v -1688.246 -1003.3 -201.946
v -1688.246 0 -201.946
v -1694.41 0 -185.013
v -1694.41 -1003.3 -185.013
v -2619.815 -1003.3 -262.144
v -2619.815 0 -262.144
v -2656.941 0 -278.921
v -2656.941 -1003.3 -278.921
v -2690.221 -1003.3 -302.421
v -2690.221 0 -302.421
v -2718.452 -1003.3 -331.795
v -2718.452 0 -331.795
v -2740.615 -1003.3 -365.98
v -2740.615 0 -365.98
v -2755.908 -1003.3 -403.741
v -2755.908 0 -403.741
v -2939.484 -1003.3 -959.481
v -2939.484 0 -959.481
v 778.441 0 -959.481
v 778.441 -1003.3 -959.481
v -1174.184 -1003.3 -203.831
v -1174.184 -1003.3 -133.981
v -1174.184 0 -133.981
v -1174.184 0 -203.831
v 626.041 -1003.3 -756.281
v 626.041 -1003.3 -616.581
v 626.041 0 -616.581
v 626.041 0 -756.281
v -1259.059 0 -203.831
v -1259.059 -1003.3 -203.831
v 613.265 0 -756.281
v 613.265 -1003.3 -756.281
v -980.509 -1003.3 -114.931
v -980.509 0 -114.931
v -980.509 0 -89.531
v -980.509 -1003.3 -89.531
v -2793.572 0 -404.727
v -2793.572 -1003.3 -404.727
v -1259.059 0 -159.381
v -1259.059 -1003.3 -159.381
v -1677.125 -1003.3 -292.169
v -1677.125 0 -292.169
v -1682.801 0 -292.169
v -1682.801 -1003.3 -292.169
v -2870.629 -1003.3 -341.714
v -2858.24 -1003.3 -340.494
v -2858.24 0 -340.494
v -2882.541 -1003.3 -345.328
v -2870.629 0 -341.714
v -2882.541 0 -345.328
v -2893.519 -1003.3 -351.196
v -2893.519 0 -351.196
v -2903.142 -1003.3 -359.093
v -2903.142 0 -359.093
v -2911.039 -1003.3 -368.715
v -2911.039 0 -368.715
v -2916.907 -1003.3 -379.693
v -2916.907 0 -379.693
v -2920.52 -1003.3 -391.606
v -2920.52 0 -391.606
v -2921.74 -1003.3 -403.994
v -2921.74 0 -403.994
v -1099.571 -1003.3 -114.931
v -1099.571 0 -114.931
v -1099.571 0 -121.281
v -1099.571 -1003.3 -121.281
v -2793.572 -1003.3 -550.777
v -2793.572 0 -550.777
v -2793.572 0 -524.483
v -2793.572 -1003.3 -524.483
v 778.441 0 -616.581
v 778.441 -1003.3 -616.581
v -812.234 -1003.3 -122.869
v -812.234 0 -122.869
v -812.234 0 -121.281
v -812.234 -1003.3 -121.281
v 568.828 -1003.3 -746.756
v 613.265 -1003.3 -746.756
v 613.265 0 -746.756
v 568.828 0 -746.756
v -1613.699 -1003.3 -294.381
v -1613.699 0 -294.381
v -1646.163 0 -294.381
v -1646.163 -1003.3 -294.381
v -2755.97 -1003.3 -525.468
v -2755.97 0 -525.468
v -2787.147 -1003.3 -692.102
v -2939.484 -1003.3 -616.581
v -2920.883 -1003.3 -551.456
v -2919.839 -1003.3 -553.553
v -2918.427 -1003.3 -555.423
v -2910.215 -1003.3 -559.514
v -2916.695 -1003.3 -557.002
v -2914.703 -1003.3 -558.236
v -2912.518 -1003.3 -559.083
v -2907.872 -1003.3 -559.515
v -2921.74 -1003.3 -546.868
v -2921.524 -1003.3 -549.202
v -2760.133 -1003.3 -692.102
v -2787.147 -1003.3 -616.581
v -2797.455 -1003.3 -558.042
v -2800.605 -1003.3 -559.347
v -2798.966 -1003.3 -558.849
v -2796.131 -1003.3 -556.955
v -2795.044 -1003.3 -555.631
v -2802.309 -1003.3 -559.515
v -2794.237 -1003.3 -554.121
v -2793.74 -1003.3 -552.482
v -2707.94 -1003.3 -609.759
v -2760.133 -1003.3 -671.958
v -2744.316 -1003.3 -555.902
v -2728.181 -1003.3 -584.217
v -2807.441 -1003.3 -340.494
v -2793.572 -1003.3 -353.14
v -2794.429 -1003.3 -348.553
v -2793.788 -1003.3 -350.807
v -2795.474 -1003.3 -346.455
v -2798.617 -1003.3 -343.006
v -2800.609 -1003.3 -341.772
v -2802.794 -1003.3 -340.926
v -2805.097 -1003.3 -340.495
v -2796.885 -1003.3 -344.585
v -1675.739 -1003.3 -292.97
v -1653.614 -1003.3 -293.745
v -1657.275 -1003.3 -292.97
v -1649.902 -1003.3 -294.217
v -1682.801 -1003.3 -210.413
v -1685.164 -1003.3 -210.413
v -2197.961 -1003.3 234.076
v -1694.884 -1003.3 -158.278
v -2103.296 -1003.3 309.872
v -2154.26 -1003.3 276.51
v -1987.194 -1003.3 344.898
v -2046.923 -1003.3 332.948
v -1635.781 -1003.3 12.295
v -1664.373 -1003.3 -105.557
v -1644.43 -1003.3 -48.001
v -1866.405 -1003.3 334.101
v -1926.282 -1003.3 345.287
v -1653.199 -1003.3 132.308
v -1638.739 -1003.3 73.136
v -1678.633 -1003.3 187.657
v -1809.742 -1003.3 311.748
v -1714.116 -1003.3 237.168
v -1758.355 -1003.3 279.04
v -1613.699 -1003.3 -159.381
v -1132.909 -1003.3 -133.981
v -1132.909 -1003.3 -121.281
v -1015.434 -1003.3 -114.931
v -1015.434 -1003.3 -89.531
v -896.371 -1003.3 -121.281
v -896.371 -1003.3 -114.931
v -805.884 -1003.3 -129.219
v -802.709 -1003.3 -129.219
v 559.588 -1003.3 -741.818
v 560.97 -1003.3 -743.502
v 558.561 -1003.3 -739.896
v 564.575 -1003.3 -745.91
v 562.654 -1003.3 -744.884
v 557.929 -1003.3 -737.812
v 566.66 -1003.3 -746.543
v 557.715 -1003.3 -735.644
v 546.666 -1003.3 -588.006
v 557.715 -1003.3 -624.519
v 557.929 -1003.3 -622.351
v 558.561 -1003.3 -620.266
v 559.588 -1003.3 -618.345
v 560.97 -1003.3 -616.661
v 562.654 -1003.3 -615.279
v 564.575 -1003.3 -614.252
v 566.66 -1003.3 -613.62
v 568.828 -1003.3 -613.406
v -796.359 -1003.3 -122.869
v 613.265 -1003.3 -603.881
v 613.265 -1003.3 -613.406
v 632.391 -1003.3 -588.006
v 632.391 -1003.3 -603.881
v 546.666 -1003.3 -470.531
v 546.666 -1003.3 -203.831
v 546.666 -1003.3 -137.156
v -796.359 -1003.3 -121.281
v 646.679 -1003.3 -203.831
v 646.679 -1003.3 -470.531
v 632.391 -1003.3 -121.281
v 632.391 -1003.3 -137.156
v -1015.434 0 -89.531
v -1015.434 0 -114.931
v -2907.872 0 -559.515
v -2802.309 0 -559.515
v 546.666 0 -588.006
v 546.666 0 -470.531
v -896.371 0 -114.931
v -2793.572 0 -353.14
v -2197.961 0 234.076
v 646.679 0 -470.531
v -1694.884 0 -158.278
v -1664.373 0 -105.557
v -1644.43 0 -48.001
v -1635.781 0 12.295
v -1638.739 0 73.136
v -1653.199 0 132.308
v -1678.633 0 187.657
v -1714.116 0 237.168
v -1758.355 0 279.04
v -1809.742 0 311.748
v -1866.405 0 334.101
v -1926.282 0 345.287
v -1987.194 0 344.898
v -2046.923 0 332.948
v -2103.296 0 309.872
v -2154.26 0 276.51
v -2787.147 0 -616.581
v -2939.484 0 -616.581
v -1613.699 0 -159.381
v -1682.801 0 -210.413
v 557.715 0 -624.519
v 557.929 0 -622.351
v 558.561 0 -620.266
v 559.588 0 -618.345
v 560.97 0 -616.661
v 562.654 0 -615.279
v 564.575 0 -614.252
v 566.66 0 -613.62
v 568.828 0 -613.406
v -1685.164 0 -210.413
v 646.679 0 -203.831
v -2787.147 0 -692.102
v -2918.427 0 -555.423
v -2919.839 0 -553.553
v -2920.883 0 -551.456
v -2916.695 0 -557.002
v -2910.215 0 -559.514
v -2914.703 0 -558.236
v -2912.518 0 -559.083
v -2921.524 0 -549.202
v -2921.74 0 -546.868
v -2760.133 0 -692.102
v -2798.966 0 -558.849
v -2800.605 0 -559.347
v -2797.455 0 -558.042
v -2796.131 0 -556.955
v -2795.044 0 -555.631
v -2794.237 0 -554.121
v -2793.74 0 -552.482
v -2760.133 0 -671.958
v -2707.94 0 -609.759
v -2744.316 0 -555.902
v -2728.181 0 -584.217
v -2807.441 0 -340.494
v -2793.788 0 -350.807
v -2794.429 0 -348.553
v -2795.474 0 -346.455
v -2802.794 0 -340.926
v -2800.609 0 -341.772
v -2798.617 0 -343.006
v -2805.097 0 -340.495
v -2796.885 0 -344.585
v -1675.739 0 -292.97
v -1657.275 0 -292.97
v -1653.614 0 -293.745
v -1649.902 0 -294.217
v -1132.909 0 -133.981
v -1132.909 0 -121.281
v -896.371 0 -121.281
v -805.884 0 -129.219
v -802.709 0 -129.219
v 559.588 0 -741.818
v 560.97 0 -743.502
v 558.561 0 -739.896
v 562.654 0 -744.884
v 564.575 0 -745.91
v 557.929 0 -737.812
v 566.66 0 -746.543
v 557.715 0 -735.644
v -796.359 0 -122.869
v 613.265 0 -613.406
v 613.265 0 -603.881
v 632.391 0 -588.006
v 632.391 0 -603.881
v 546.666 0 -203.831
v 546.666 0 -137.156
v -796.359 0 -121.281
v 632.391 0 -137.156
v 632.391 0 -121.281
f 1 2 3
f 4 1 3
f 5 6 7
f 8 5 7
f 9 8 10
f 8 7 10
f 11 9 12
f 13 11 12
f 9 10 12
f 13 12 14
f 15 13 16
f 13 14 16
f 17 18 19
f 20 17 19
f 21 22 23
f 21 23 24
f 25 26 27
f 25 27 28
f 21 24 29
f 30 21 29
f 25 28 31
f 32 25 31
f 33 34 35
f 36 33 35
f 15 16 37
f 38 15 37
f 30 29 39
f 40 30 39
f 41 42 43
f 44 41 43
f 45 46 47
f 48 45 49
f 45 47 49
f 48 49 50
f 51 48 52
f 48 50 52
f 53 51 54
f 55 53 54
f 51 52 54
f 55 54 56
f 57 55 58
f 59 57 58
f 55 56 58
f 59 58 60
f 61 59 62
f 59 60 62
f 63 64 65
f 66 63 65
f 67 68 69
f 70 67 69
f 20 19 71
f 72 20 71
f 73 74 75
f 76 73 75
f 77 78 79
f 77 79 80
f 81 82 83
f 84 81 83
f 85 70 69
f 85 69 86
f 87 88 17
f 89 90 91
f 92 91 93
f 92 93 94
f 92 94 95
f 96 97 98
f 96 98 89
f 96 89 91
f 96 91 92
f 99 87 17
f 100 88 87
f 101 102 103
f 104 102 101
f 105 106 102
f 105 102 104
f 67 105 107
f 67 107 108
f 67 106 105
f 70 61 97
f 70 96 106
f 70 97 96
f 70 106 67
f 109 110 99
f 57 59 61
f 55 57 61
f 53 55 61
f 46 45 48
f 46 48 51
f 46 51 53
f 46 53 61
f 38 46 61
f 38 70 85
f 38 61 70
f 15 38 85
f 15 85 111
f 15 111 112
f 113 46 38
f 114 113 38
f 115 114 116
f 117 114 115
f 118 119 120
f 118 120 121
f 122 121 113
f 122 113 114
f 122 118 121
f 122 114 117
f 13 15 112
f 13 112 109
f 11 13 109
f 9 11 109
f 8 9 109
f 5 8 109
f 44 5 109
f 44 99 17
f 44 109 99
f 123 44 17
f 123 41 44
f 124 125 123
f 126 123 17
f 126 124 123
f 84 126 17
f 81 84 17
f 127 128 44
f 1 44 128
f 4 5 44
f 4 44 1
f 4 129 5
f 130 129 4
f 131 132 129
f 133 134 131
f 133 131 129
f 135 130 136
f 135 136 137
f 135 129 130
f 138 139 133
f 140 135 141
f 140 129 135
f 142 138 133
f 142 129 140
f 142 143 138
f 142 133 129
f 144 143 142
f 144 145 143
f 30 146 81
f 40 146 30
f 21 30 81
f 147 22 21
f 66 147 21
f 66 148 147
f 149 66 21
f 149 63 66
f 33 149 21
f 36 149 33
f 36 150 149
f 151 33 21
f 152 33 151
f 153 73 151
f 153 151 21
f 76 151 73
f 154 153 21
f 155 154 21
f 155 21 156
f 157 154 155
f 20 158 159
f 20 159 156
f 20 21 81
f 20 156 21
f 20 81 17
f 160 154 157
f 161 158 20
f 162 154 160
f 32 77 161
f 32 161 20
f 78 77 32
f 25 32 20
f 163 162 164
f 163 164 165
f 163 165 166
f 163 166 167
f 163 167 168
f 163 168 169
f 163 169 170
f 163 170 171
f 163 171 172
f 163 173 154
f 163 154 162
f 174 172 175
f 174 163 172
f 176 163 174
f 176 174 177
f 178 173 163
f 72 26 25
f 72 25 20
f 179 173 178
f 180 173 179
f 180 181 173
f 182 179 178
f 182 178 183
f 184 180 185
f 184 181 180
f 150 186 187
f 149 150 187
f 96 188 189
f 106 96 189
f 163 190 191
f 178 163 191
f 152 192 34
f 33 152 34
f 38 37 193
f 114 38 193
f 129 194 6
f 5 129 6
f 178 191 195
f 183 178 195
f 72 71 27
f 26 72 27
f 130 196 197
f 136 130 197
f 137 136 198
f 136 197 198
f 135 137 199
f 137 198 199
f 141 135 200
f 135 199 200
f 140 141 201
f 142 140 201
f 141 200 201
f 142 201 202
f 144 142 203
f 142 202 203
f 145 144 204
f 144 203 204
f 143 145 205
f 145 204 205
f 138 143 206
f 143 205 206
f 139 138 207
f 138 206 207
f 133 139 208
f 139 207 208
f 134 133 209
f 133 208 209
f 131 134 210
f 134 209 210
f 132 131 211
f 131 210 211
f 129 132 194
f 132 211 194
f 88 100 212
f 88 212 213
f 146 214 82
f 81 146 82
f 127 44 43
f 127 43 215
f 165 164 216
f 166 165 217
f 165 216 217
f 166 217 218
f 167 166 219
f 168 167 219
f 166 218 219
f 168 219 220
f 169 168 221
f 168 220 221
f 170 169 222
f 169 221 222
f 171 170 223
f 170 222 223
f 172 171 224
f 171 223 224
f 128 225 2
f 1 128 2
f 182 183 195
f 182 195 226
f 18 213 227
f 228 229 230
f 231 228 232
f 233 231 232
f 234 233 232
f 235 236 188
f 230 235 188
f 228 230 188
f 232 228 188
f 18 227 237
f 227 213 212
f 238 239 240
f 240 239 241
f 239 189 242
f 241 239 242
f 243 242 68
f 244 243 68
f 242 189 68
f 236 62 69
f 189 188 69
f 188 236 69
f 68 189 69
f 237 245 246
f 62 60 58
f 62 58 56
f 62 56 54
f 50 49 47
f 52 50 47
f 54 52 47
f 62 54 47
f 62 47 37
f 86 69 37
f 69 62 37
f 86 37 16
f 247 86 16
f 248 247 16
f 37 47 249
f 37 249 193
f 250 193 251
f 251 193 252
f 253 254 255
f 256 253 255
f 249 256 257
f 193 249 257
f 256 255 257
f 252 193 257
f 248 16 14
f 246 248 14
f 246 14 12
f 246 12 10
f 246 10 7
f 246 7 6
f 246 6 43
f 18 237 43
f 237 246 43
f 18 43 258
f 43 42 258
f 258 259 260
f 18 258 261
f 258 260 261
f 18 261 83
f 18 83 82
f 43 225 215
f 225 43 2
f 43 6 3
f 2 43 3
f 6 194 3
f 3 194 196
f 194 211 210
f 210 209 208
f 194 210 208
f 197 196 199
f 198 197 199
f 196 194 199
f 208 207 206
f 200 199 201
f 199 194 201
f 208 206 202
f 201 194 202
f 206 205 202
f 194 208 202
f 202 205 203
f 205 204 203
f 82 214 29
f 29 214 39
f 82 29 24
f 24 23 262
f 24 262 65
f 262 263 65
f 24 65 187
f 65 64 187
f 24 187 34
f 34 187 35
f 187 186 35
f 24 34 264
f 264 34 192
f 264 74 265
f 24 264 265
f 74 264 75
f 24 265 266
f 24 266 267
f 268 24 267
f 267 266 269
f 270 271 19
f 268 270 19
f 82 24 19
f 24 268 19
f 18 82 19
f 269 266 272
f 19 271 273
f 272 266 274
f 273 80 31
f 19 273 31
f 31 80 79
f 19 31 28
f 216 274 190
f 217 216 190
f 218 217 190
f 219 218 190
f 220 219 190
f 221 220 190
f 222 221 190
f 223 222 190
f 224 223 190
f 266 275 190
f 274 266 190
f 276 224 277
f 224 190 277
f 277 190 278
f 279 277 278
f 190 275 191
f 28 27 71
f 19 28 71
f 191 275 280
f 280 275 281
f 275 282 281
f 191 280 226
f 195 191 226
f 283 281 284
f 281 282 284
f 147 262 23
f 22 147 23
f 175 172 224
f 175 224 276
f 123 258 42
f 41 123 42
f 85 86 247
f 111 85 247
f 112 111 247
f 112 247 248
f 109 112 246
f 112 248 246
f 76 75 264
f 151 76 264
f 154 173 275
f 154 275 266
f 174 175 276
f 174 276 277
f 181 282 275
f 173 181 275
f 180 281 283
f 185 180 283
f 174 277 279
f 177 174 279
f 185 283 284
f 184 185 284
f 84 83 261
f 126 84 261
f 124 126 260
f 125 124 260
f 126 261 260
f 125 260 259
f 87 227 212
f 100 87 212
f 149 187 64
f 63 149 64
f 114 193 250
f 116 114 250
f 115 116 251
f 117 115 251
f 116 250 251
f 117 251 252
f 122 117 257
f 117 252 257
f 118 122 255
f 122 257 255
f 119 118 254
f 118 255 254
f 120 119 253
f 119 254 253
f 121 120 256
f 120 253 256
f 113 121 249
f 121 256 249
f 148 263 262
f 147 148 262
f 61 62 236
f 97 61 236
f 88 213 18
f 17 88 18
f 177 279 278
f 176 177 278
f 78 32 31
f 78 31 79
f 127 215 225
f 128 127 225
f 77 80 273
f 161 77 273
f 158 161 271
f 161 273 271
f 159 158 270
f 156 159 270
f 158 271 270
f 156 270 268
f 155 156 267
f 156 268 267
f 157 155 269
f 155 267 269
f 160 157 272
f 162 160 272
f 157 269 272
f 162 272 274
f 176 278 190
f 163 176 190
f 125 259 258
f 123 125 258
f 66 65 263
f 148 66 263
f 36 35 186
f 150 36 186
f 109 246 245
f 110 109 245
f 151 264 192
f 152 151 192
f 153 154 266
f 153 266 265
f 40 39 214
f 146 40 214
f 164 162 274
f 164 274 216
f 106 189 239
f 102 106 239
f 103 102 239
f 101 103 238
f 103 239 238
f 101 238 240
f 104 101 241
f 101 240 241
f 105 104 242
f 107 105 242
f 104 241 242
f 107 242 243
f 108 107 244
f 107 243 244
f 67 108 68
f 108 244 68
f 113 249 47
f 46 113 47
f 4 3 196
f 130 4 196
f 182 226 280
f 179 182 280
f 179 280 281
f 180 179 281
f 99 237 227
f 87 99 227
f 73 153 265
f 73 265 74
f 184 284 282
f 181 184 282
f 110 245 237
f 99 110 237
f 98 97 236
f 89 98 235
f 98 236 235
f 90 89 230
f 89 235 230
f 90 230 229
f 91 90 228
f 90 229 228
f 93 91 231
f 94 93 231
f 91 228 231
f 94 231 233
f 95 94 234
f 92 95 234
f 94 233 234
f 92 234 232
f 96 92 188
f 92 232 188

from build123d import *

# Parameters (mm, degrees)
F1_DEPTH = 1003.3


# Not quite as in the source:
# - ends of sketch curves that miss each other by under 0.0002 mm in the source are joined


with BuildPart() as f1:
    # F0 (on Front) → F1 (new body)
    with BuildSketch(Plane.XZ):
        with BuildLine():
            Line((-2939.4839356, -616.5813424), (-2939.4839356, -959.4813424))
            Line((-2939.4839356, -959.4813424), (778.4410644, -959.4813424))
            Line((778.4410644, -959.4813424), (778.4410644, -616.5813424))
            Line((778.4410644, -616.5813424), (626.0410644, -616.5813424))
            Line((626.0410644, -616.5813424), (626.0410644, -756.2813424))
            Line((626.0410644, -756.2813424), (613.264839, -756.2813424))
            Line((613.264839, -756.2813424), (613.264839, -746.7563424))
            Line((613.264839, -746.7563424), (568.8275644, -746.7563424))
            ThreePointArc((568.8275644, -746.7563424), (560.9698402941, -743.5015665059), (557.7150644, -735.6438424))
            Line((557.7150644, -735.6438424), (557.7150644, -624.5188424))
            ThreePointArc((557.7150644, -624.5188424), (560.9698402941, -616.6611182941), (568.8275644, -613.4063424))
            Line((568.8275644, -613.4063424), (613.264839, -613.4063424))
            Line((613.264839, -613.4063424), (613.264839, -603.8813424))
            Line((613.264839, -603.8813424), (632.3910644, -603.8813424))
            Line((632.3910644, -603.8813424), (632.3910644, -588.0063424))
            Line((632.3910644, -588.0063424), (546.6660644, -588.0063424))
            Line((546.6660644, -588.0063424), (546.6660644, -470.5313424))
            Line((546.6660644, -470.5313424), (646.6785644, -470.5313424))
            Line((646.6785644, -470.5313424), (646.6785644, -203.8313424))
            Line((646.6785644, -203.8313424), (546.6660644, -203.8313424))
            Line((546.6660644, -203.8313424), (546.6660644, -137.1563424))
            Line((546.6660644, -137.1563424), (632.3910644, -137.1563424))
            Line((632.3910644, -137.1563424), (632.3910644, -121.2813424))
            Line((632.3910644, -121.2813424), (-796.3589356, -121.2813424))
            Line((-796.3589356, -121.2813424), (-796.3589356, -122.8688424))
            Line((-796.3589356, -122.8688424), (-802.7089356, -129.2188424))
            Line((-802.7089356, -129.2188424), (-805.8839356, -129.2188424))
            Line((-805.8839356, -129.2188424), (-812.2339356, -122.8688424))
            Line((-812.2339356, -122.8688424), (-812.2339356, -121.2813424))
            Line((-812.2339356, -121.2813424), (-896.3714356, -121.2813424))
            Line((-896.3714356, -121.2813424), (-896.3714356, -114.9313424))
            Line((-896.3714356, -114.9313424), (-980.5089356, -114.9313424))
            Line((-980.5089356, -114.9313424), (-980.5089356, -89.5313424))
            Line((-980.5089356, -89.5313424), (-1015.4339356, -89.5313424))
            Line((-1015.4339356, -89.5313424), (-1015.4339356, -114.9313424))
            Line((-1015.4339356, -114.9313424), (-1099.5714356, -114.9313424))
            Line((-1099.5714356, -114.9313424), (-1099.5714356, -121.2813424))
            Line((-1099.5714356, -121.2813424), (-1132.9089356, -121.2813424))
            Line((-1132.9089356, -121.2813424), (-1132.9089356, -133.9813424))
            Line((-1132.9089356, -133.9813424), (-1148.7839356, -133.9813424))
            Line((-1148.7839356, -133.9813424), (-1174.1839356, -133.9813424))
            Line((-1174.1839356, -133.9813424), (-1174.1839356, -203.8313424))
            Line((-1174.1839356, -203.8313424), (-1259.05895, -203.8313424))
            Line((-1259.05895, -203.8313424), (-1259.05895, -159.3813424))
            Line((-1259.05895, -159.3813424), (-1613.699211, -159.3813424))
            Line((-1613.699211, -159.3813424), (-1613.699211, -294.3812756))
            Line((-1613.699211, -294.3812756), (-1646.1628748, -294.3812756))
            ThreePointArc((-1646.1628748, -294.3812756), (-1651.7627631889, -294.0190472383), (-1657.275348851, -292.9695922491))
            Line((-1657.275348851, -292.9695922491), (-1675.7391174, -292.9695944))
            Line((-1675.7391174, -292.9695944), (-1677.1249922, -292.169469))
            Line((-1677.1249922, -292.169469), (-1682.8014604, -292.169469))
            Line((-1682.8014604, -292.169469), (-1682.8014604, -210.4132444))
            Line((-1682.8014604, -210.4132444), (-1685.1643462, -210.4132444))
            Line((-1685.1643462, -210.4132444), (-1688.2464838, -201.946002))
            Line((-1688.2464838, -201.946002), (-1694.410124, -185.0132444))
            Line((-1694.410124, -185.0132444), (-1694.8839341458, -158.2775865747))
            ThreePointArc((-1694.8839341458, -158.2775865747), (-1758.355211766, 279.0397129741), (-2197.9610443697, 234.0759997359))
            Line((-2197.9610443697, 234.0759997359), (-2619.8151165819, -262.1438110898))
            ThreePointArc((-2619.8151165819, -262.1438110898), (-2705.0357961417, -316.4357706996), (-2755.9076582696, -403.7411814515))
            Line((-2755.9076582696, -403.7411814515), (-2793.5718559027, -404.7273278365))
            Line((-2793.5718559027, -404.7273278365), (-2793.5718559027, -353.1400729063))
            ThreePointArc((-2793.5718559027, -353.1400729063), (-2797.7147534728, -343.7557355538), (-2807.4405116, -340.493985))
            Line((-2807.4405116, -340.493985), (-2858.2403846, -340.493985))
            ThreePointArc((-2858.2403846, -340.493985), (-2903.1415574423, -359.0926597577), (-2921.7402322, -403.9938326))
            Line((-2921.7402322, -403.9938326), (-2921.7402322, -546.868477))
            ThreePointArc((-2921.7402322, -546.868477), (-2917.5973338103, -556.2528150998), (-2907.8715742938, -559.5145647022))
            Line((-2907.8715742938, -559.5145647022), (-2802.3094282938, -559.5145647022))
            ThreePointArc((-2802.3094282938, -559.5145647022), (-2796.1310300431, -556.9553883529), (-2793.5718536938, -550.7769901022))
            Line((-2793.5718536938, -550.7769901022), (-2793.5718536938, -524.4830607299))
            Line((-2793.5718536938, -524.4830607299), (-2755.9704253207, -525.4675636528))
            ThreePointArc((-2755.9704253207, -525.4675636528), (-2736.7875568064, -570.3667556741), (-2707.9399906828, -609.7588591639))
            Line((-2707.9399906828, -609.7588591639), (-2760.1328298938, -671.9575077155))
            Line((-2760.1328298938, -671.9575077155), (-2760.1328298938, -692.1022345022))
            Line((-2760.1328298938, -692.1022345022), (-2787.1466950938, -692.1022345022))
            Line((-2787.1466950938, -692.1022345022), (-2787.1466950938, -616.5813424))
            Line((-2787.1466950938, -616.5813424), (-2939.4839356, -616.5813424))
        make_face()
    extrude(amount=F1_DEPTH)


solid = f1.part
